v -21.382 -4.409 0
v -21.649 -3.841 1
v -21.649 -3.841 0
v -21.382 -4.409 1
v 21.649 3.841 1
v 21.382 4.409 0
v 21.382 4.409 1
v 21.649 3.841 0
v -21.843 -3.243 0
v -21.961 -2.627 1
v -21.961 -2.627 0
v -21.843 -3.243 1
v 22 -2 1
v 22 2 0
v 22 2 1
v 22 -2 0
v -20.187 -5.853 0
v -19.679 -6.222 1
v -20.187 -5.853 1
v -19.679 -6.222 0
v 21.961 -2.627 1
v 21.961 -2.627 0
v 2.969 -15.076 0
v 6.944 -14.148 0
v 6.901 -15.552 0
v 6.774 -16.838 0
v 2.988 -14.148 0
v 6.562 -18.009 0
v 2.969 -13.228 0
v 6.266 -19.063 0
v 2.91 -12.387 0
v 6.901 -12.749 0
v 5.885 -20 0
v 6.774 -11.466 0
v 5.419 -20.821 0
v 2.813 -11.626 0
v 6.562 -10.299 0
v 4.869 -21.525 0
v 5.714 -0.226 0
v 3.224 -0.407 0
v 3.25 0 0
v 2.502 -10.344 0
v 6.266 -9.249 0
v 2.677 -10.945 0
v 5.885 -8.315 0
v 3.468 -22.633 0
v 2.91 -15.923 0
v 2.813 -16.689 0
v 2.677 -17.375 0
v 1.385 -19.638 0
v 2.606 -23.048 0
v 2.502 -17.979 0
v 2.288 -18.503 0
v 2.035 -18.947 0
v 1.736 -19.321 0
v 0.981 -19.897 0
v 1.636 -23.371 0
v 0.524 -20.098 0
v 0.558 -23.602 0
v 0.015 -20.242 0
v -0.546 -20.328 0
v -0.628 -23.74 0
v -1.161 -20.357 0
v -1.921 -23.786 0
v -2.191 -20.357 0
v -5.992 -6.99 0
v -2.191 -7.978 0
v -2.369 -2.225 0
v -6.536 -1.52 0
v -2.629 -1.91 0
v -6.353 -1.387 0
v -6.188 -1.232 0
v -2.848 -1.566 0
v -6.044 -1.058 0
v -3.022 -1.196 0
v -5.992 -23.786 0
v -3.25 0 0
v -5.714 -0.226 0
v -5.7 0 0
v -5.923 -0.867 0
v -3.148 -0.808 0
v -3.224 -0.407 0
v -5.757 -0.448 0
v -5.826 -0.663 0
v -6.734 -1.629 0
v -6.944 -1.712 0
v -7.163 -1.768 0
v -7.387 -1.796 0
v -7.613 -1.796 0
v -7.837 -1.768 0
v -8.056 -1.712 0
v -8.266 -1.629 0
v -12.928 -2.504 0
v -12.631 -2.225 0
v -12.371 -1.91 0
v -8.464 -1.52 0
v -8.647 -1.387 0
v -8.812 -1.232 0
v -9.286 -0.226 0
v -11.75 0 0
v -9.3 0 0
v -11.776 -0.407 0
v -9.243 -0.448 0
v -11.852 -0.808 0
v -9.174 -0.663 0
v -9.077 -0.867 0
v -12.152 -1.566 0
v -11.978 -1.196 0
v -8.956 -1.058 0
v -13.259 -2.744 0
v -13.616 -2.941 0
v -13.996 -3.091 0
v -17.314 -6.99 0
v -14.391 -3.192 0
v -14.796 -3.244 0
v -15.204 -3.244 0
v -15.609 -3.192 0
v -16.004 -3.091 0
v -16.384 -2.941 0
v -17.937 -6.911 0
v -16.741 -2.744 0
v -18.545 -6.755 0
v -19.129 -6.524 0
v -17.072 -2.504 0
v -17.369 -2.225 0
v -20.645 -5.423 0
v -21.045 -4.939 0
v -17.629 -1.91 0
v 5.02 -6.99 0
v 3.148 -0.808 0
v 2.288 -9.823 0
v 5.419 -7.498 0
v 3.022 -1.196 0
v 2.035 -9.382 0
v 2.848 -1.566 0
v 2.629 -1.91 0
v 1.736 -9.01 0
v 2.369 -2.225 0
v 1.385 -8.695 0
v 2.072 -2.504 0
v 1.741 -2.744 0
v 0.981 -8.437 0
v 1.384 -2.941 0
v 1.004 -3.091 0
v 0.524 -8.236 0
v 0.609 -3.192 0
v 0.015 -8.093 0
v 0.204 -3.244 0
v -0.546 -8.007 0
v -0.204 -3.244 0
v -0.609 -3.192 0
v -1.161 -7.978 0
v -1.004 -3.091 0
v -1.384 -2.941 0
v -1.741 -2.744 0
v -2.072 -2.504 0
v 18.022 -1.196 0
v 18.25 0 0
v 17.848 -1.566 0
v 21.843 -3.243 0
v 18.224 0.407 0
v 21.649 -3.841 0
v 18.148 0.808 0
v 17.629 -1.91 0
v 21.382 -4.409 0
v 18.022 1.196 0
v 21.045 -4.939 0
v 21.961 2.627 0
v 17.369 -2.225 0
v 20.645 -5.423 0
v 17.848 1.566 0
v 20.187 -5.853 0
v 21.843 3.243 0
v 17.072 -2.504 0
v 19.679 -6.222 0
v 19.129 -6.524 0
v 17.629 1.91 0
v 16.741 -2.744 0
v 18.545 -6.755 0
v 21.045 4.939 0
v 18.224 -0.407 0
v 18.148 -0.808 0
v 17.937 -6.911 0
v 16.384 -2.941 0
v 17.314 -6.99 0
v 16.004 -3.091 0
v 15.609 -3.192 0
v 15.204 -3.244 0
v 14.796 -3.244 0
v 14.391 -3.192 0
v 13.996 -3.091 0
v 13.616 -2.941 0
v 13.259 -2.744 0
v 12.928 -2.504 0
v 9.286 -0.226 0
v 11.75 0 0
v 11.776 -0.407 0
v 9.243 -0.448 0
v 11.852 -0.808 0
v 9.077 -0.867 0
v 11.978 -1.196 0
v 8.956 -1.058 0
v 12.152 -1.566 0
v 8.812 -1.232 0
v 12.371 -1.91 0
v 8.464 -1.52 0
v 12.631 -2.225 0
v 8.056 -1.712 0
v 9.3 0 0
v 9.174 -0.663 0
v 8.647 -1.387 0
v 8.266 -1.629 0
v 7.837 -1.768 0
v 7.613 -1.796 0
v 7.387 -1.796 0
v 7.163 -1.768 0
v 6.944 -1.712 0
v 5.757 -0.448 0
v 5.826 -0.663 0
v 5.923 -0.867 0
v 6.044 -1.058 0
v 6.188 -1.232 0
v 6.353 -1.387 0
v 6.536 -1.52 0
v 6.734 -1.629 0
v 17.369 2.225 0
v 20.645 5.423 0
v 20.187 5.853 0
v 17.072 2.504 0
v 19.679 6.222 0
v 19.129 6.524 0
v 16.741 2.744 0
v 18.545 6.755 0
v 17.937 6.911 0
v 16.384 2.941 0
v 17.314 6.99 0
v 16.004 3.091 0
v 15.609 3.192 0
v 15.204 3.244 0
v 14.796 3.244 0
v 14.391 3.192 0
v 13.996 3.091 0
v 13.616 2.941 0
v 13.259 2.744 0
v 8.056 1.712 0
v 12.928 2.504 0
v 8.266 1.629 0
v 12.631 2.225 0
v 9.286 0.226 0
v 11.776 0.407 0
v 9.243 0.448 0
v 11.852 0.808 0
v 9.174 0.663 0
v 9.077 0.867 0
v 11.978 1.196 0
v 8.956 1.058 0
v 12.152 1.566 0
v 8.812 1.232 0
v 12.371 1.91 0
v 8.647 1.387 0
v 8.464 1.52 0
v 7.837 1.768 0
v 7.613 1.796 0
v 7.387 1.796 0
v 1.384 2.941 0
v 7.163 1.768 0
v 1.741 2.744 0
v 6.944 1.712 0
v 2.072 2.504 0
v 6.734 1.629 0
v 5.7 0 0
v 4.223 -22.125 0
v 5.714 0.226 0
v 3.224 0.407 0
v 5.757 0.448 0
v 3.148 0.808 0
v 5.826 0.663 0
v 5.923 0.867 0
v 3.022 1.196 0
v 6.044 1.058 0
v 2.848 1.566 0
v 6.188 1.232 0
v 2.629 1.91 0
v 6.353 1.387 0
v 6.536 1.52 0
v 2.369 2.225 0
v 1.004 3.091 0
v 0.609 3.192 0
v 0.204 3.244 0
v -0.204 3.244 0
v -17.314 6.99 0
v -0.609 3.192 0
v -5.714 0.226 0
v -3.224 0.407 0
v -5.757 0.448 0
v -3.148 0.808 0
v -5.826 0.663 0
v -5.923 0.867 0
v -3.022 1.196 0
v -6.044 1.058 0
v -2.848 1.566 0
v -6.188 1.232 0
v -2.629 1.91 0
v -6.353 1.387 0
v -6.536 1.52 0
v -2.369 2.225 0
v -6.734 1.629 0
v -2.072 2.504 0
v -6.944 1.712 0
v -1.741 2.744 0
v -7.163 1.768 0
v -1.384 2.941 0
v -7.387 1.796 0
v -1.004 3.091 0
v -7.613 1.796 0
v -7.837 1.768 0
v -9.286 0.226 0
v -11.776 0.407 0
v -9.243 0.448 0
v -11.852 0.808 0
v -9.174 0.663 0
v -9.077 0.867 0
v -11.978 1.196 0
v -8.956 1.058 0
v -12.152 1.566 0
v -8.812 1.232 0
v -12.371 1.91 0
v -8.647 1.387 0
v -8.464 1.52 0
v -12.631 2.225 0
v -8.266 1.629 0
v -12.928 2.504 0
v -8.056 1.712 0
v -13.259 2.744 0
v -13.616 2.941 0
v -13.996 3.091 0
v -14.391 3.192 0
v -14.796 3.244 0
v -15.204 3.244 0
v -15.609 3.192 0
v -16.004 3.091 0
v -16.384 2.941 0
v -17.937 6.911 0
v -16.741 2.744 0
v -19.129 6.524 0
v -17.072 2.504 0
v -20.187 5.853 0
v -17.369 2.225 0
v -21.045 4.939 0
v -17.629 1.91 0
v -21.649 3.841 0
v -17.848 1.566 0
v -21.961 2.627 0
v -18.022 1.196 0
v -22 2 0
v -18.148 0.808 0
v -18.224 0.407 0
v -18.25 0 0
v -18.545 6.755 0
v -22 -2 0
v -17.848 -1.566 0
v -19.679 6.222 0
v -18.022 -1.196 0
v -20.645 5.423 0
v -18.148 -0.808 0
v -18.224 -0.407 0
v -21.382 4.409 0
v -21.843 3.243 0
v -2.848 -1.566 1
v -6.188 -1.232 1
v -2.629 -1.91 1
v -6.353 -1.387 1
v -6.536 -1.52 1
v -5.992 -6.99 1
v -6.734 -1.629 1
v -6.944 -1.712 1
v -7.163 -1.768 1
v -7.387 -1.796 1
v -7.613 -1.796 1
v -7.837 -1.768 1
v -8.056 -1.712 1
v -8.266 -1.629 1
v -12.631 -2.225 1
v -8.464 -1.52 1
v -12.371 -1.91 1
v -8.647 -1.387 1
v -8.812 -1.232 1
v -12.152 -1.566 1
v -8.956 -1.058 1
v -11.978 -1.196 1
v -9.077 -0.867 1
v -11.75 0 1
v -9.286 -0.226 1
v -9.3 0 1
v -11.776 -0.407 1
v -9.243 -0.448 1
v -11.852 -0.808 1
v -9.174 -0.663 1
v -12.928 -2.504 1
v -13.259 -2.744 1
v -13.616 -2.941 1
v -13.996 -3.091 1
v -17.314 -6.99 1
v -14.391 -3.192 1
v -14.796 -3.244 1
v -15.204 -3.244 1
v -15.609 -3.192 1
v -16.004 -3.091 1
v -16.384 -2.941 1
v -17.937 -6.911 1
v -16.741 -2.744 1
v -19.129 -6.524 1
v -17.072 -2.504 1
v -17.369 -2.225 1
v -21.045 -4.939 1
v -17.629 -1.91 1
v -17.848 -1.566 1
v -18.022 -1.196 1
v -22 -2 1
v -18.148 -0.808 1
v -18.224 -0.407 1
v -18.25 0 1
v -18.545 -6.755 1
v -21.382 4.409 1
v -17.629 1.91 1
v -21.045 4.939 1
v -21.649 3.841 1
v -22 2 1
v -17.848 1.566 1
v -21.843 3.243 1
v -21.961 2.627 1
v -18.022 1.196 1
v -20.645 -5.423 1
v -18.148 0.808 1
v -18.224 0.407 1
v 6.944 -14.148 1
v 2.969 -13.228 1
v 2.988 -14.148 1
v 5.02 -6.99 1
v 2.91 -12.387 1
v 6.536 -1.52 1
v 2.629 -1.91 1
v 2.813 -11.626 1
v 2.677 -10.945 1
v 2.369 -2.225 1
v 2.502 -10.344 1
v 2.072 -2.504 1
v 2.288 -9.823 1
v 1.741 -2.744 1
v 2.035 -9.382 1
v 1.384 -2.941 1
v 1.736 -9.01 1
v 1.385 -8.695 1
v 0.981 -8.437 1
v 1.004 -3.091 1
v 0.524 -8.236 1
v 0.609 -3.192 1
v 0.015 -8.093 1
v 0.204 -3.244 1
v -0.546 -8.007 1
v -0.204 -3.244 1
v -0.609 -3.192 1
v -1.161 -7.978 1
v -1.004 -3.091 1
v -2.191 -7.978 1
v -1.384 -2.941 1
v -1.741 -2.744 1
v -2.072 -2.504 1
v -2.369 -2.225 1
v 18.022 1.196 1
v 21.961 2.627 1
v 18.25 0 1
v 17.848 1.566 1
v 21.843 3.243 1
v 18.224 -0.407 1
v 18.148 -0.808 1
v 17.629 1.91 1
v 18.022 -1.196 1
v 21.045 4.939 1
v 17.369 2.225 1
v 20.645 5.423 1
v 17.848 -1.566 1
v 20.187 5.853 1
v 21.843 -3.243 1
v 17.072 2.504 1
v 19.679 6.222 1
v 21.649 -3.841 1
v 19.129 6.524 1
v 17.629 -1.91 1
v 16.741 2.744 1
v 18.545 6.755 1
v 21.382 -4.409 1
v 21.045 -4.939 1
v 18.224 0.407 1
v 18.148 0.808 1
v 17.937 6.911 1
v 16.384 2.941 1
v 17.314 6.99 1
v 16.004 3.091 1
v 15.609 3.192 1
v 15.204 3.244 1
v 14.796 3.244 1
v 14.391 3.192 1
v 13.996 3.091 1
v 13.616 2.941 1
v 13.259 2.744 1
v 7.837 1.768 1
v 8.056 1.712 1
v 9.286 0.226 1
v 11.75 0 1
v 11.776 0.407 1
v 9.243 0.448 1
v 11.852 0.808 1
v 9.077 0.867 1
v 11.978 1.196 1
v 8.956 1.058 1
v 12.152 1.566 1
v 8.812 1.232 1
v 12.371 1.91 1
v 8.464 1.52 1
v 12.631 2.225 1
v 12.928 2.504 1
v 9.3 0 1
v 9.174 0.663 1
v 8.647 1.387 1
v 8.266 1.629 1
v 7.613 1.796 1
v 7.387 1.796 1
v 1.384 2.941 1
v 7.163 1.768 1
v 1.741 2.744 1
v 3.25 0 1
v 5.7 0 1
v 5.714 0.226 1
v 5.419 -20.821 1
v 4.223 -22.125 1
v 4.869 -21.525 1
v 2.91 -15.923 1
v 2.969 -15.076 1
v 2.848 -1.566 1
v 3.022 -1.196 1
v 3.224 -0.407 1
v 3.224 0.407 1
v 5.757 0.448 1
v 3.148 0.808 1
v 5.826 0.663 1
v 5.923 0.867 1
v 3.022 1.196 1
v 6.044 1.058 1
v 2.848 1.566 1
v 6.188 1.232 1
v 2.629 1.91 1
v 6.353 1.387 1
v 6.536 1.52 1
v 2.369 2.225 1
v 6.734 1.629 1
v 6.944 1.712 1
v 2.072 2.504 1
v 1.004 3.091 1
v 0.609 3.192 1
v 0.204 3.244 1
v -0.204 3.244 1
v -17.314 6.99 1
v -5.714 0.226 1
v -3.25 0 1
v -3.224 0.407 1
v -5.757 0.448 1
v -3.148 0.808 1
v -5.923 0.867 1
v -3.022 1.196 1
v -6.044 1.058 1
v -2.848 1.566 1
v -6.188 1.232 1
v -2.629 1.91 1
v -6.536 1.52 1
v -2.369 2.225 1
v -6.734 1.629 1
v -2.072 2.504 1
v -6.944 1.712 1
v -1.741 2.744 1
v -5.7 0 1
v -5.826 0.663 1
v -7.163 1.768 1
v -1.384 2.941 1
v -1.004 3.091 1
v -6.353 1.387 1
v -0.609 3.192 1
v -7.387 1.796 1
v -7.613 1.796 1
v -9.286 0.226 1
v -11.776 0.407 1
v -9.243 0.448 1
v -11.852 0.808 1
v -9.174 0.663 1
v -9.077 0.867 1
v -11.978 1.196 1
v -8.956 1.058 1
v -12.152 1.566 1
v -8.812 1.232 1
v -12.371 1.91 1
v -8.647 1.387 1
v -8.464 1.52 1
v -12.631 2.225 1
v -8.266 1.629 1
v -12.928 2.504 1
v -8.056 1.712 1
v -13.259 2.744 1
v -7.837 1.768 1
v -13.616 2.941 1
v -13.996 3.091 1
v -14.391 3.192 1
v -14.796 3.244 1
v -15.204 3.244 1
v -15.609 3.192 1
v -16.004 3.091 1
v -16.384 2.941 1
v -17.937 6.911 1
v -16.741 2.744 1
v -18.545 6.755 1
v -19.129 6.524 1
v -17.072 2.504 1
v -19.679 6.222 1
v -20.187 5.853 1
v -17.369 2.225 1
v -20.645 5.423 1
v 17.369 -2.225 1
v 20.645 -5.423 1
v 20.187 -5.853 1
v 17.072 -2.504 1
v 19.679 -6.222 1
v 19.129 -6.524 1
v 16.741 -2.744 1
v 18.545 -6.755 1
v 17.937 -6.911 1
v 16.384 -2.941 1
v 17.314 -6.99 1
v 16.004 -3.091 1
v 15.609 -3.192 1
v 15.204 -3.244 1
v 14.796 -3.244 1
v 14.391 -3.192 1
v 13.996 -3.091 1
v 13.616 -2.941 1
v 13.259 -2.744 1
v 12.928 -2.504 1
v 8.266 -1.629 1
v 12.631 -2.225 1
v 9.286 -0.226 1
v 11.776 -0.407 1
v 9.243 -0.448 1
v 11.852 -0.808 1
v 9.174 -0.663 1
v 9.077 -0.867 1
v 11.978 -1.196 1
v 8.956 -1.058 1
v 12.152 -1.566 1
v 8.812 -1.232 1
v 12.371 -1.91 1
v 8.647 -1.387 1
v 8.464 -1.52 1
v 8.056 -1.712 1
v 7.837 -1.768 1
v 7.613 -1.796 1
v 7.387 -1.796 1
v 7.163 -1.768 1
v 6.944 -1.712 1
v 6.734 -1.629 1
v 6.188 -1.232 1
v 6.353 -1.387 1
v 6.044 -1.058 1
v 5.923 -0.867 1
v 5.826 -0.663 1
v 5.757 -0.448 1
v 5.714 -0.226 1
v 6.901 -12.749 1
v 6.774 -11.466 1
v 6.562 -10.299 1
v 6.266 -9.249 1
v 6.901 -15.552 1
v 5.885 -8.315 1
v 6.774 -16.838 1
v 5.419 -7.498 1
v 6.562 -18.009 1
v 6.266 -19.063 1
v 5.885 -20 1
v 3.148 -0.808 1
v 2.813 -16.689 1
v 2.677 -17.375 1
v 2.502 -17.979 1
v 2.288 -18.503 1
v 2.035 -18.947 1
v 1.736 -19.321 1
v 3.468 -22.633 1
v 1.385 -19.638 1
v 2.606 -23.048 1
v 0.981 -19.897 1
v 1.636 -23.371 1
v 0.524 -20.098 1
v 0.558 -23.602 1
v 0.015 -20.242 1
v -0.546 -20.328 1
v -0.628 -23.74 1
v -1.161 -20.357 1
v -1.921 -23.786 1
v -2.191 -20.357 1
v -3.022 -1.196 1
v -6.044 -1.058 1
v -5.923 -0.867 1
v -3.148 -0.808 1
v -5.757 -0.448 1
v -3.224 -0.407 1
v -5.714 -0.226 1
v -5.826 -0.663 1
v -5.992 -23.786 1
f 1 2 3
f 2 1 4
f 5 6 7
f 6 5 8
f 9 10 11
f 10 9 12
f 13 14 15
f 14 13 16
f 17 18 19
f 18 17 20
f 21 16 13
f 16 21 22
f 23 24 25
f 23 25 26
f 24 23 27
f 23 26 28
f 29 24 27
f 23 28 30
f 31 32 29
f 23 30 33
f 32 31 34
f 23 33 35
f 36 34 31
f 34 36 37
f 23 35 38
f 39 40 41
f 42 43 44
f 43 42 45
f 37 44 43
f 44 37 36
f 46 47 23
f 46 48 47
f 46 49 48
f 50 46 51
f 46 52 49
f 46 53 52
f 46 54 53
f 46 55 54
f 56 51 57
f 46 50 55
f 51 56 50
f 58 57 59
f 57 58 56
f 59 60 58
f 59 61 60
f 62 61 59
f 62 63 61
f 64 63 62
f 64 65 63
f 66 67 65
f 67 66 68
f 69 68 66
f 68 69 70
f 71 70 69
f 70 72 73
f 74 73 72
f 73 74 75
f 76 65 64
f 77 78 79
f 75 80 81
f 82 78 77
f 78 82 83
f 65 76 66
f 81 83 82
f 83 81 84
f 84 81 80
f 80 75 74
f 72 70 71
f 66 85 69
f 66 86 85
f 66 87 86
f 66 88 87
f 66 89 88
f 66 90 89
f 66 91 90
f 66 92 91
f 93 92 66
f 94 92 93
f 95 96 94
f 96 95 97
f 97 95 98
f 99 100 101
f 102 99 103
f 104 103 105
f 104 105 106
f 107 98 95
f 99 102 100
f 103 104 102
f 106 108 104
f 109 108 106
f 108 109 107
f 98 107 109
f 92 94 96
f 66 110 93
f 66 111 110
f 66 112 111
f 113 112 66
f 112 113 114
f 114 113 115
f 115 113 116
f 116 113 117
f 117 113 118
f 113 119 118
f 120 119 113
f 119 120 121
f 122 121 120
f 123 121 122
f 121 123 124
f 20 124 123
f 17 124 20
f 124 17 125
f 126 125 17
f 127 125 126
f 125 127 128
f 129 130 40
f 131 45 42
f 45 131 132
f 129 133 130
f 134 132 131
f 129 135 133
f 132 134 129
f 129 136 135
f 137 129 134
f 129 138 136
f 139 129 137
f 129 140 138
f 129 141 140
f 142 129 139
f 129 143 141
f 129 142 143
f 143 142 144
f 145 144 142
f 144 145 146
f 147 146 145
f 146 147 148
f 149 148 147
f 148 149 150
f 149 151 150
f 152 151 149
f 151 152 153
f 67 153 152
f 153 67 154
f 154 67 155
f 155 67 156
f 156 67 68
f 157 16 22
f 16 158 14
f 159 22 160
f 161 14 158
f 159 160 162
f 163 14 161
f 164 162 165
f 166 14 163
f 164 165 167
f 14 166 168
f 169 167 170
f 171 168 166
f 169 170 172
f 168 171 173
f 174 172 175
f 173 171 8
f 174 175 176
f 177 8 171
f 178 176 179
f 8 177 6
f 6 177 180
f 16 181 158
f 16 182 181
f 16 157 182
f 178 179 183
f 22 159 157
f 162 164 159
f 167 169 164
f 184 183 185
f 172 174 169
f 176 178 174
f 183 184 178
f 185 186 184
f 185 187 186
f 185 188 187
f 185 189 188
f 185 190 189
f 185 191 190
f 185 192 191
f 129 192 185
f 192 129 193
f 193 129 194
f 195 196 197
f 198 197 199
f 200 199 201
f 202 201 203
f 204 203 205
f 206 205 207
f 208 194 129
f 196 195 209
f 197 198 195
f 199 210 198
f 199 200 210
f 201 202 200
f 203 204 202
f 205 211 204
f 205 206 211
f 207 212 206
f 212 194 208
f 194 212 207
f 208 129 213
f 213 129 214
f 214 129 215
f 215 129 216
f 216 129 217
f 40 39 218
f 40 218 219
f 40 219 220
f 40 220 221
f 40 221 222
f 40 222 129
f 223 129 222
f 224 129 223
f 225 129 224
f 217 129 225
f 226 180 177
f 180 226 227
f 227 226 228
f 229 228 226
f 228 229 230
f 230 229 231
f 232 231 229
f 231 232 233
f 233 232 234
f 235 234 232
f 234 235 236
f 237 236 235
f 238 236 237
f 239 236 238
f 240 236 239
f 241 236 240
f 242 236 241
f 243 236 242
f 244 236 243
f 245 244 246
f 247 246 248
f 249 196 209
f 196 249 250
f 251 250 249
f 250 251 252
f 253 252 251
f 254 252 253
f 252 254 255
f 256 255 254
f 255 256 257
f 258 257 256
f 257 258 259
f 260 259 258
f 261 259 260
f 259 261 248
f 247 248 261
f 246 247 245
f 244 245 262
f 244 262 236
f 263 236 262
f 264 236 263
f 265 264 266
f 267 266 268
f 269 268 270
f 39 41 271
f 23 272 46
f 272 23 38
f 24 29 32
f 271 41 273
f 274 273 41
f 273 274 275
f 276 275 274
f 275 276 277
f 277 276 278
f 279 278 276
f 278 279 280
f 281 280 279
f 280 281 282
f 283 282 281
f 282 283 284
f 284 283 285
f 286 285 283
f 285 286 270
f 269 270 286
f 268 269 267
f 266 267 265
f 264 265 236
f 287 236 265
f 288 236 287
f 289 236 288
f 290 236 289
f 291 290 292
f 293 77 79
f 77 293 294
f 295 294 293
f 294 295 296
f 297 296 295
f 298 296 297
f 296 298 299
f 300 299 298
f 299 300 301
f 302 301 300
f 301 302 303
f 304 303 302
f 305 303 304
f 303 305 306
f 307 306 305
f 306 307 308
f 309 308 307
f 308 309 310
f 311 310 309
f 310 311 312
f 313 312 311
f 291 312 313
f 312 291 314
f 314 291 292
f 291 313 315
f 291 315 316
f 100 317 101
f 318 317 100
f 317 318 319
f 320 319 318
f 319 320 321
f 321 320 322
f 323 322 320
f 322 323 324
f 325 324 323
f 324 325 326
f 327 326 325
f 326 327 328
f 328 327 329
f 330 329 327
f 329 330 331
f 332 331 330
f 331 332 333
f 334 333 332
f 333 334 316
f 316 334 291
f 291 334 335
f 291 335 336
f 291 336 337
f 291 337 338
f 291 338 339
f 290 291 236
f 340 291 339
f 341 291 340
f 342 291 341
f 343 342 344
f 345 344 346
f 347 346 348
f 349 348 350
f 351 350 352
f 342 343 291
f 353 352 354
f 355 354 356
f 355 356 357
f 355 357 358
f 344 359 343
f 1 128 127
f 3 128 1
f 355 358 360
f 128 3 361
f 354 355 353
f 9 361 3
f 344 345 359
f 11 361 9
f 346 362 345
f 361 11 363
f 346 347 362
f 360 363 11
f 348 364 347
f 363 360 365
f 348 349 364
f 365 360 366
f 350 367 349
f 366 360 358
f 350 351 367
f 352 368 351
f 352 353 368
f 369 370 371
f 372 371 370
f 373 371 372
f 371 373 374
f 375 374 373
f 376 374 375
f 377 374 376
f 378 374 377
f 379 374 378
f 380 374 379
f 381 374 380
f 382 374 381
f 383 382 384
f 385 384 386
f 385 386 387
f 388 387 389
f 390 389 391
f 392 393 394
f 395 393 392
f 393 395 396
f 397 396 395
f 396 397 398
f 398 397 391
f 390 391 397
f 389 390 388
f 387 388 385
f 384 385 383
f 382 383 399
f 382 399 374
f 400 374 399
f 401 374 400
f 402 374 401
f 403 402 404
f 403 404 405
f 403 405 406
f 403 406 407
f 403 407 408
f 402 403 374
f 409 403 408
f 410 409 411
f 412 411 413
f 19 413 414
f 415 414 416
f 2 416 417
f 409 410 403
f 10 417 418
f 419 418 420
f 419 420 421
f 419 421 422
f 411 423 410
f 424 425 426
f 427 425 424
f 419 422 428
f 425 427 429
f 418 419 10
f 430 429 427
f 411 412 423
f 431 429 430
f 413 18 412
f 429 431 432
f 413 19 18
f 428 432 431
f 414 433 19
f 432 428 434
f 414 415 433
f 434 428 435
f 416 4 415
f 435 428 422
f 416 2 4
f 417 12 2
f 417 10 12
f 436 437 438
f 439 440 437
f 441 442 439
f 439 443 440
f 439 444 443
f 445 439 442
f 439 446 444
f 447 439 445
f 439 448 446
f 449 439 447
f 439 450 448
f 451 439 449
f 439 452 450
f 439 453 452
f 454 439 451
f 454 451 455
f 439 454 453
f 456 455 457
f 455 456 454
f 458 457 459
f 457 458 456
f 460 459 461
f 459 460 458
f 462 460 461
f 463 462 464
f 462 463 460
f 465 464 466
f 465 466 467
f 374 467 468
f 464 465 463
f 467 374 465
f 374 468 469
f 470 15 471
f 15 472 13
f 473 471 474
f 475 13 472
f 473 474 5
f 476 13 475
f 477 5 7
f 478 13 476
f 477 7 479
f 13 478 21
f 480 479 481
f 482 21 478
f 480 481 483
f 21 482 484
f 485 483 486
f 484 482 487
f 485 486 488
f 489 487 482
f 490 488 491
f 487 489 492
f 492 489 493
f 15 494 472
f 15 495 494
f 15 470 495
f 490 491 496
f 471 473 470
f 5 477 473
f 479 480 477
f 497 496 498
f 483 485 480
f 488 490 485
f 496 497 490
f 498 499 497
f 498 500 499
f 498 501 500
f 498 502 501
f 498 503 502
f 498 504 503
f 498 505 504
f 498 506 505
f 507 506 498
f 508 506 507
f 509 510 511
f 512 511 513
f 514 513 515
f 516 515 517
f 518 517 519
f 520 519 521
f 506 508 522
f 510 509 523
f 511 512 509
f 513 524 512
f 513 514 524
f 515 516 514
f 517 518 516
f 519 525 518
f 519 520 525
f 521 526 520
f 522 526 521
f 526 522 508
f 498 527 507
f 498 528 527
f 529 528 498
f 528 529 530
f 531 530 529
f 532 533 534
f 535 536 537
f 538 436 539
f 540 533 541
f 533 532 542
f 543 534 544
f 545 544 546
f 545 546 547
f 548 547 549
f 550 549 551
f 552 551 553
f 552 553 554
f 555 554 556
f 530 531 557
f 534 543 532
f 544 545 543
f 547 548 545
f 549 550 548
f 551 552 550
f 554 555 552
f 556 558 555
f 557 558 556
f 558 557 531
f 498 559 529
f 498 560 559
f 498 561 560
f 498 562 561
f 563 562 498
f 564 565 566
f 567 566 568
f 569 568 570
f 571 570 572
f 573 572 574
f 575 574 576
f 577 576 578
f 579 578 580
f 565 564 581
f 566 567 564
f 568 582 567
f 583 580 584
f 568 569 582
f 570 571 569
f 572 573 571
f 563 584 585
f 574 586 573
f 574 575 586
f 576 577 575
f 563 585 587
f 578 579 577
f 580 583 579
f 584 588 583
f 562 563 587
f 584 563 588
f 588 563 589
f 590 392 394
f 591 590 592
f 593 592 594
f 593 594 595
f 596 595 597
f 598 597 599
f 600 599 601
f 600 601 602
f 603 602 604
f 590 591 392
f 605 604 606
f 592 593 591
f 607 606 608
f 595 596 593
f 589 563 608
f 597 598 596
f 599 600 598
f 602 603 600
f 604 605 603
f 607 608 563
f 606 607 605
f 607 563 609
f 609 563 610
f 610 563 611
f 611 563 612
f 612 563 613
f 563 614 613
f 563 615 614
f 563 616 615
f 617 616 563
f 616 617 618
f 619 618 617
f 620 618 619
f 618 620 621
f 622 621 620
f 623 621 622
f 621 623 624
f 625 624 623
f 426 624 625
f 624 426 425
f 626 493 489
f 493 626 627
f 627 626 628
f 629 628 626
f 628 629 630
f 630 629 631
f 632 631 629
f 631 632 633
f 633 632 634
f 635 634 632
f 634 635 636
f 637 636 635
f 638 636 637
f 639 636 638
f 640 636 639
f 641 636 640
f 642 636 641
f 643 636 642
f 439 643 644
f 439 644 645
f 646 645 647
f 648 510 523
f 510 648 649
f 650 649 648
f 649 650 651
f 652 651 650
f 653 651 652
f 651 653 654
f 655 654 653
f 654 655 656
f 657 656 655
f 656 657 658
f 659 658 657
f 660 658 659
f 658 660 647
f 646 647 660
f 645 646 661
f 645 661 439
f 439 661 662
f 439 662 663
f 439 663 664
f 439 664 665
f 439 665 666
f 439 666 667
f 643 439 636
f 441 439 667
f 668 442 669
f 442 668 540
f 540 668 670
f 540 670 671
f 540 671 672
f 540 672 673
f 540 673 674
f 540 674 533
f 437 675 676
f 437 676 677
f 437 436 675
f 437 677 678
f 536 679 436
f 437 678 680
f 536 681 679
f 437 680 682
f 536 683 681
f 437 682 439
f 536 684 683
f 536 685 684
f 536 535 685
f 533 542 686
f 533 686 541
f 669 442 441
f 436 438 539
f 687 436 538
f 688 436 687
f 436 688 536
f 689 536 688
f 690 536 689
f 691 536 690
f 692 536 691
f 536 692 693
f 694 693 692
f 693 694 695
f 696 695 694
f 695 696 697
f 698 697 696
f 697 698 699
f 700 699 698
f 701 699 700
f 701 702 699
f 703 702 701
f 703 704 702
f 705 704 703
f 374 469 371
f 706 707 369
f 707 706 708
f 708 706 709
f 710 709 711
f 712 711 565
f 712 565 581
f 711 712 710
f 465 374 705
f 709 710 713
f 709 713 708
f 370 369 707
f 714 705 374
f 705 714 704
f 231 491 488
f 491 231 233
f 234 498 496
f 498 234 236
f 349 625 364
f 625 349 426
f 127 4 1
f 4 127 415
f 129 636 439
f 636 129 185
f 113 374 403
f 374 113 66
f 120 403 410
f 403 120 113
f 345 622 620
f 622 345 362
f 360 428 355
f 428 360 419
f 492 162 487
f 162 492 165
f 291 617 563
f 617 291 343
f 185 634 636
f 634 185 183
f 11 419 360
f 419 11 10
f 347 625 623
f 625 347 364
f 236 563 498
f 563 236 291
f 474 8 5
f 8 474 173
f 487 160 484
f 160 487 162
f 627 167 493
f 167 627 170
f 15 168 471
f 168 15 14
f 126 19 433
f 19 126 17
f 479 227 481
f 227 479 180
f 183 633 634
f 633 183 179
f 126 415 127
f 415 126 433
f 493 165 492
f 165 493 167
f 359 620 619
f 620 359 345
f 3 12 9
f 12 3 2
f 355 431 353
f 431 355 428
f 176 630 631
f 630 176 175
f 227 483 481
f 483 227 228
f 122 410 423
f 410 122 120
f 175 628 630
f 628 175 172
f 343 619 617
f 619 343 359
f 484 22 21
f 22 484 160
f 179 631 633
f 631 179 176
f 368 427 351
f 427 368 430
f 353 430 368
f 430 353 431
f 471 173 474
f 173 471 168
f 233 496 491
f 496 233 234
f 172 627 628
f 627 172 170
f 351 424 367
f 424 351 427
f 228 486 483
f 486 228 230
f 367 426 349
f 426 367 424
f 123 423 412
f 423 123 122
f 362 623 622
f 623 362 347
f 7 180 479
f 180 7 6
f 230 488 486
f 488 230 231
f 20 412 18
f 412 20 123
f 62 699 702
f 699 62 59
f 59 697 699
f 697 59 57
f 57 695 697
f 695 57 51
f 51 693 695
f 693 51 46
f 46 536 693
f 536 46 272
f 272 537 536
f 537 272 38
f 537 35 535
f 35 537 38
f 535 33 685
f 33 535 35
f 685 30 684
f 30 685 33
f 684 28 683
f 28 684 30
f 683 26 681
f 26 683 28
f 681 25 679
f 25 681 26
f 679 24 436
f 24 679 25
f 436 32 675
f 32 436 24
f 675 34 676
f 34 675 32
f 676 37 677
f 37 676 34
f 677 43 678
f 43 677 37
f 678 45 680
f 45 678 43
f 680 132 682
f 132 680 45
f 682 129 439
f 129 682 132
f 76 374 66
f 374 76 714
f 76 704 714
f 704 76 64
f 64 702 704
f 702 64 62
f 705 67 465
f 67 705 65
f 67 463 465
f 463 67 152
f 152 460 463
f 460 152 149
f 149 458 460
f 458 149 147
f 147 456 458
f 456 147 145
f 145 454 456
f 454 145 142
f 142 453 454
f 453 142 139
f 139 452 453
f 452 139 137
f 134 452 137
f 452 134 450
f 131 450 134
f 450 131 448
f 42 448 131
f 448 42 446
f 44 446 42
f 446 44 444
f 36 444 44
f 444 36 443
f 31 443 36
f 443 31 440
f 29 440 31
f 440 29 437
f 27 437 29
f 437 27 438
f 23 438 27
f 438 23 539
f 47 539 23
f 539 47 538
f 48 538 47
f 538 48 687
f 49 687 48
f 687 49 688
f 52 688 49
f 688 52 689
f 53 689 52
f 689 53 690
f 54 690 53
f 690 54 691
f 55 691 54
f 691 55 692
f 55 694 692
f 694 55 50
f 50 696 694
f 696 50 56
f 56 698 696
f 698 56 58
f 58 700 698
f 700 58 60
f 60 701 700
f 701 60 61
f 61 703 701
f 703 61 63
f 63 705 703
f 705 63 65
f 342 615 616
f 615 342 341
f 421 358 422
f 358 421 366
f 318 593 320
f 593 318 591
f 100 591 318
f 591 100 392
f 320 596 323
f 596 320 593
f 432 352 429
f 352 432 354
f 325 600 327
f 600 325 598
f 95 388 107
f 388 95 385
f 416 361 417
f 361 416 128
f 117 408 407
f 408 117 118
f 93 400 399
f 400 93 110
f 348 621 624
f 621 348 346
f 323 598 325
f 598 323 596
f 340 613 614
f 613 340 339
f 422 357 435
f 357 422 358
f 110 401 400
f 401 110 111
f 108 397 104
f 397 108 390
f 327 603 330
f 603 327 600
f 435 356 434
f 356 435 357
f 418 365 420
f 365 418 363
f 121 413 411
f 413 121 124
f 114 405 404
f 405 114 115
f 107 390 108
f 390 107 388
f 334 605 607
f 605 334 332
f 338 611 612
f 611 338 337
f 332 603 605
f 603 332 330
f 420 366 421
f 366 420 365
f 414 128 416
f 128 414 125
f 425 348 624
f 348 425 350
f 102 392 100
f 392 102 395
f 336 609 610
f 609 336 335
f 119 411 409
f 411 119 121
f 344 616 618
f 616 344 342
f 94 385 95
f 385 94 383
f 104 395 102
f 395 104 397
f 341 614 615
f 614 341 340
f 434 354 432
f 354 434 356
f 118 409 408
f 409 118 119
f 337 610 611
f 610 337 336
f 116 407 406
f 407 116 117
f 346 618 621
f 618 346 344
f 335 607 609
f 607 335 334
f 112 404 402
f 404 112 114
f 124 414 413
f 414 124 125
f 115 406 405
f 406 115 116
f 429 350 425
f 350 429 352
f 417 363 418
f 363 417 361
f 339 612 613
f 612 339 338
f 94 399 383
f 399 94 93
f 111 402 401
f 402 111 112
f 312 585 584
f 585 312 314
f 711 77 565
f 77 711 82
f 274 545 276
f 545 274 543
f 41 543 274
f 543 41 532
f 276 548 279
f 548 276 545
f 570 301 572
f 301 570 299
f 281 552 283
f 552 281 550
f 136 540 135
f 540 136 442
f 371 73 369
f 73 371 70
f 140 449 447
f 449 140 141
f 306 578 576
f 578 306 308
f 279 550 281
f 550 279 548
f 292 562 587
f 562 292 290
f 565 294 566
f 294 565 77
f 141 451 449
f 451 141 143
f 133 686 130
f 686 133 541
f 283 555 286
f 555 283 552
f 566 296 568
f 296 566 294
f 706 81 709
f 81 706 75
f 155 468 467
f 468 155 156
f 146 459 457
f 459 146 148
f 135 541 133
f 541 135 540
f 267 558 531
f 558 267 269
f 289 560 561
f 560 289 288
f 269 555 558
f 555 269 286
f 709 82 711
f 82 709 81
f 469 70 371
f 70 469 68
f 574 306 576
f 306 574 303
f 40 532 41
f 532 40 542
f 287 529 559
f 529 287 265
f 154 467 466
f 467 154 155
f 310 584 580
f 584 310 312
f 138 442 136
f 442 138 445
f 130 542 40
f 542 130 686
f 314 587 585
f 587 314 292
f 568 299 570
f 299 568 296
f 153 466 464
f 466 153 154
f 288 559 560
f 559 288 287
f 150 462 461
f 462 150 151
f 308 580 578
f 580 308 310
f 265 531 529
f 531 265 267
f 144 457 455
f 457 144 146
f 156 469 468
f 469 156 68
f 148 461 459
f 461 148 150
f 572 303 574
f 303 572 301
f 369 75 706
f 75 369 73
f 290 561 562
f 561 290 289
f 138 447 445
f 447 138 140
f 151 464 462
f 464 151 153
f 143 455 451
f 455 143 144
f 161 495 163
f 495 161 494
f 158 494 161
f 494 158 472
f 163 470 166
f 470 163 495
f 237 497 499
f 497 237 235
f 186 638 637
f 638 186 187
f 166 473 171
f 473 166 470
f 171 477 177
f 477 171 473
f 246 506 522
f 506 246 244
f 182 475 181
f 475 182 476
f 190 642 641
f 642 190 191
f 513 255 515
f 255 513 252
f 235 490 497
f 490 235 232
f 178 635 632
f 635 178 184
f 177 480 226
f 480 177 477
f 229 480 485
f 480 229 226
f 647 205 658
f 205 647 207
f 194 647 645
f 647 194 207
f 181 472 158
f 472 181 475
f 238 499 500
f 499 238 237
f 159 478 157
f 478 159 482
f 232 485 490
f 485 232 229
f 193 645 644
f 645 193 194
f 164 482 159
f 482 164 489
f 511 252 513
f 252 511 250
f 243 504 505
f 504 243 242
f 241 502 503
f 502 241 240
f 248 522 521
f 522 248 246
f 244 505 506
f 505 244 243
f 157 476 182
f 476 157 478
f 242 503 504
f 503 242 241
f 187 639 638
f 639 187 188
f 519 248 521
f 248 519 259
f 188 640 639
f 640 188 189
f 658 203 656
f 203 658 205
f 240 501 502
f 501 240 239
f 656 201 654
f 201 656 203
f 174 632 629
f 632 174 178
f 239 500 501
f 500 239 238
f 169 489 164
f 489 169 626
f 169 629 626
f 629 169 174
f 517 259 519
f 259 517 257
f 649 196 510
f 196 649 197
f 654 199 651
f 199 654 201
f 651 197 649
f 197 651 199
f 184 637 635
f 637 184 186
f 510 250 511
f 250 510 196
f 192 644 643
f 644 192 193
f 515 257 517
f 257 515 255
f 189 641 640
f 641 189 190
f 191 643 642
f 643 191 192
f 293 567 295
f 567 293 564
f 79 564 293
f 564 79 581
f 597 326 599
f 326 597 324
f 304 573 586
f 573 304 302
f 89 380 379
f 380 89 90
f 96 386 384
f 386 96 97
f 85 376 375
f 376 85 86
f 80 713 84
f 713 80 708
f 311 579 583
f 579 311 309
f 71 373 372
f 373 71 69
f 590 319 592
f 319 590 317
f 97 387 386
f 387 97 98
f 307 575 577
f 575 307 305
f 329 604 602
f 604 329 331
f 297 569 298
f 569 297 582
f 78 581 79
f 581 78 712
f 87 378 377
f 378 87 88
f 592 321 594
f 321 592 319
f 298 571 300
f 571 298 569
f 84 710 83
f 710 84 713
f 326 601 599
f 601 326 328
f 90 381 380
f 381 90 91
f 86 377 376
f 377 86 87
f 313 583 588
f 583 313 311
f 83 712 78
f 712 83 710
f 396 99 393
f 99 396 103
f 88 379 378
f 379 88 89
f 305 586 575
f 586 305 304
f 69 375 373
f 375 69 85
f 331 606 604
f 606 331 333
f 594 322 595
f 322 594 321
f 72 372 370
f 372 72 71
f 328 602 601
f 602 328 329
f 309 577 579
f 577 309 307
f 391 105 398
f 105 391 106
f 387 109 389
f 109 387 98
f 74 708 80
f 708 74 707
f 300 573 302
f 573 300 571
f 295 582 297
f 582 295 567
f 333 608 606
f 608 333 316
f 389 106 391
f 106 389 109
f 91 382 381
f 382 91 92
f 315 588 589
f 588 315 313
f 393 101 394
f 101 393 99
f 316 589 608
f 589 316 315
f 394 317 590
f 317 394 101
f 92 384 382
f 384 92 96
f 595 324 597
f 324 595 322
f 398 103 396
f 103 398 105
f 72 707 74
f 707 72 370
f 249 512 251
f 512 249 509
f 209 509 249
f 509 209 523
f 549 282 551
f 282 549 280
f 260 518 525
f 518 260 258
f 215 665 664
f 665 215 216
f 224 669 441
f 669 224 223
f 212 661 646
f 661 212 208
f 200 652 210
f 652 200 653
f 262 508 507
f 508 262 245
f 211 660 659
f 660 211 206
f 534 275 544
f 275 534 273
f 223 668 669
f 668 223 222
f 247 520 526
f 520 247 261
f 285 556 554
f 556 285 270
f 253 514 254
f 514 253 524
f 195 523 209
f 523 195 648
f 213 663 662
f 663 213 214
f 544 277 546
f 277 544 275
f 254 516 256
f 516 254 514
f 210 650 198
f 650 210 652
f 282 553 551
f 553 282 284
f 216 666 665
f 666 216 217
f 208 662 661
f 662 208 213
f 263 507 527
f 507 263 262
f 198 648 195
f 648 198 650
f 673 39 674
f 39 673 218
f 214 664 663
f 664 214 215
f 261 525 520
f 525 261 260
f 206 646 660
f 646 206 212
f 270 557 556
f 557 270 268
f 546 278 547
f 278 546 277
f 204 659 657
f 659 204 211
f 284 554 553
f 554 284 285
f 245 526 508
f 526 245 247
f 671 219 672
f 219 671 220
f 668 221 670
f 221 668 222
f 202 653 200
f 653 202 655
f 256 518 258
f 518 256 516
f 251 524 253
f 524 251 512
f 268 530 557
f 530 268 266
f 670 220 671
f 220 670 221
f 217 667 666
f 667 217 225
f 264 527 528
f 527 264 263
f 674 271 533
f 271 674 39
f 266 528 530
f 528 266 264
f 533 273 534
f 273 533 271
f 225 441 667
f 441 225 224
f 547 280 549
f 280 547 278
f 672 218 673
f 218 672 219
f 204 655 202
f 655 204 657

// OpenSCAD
$fn = 50;


difference() {
	union() {
		*color(alpha = 1.0000000000, c = "gray") {
			translate(v = [0, 14, 0]) {
				linear_extrude(height = 1) {
					text(font = "Arial:style=Bold", halign = "center", size = 4.5000000000, text = "COMMENT description oobb_plate_shape_p_type_1_depth_3_width_1_thickness_d_extra_oobb_size", valign = "center");
				}
			}
		}
		hull() {
			translate(v = [-17.0000000000, 2.0000000000, 0]) {
				cylinder(h = 1, r = 5);
			}
			translate(v = [17.0000000000, 2.0000000000, 0]) {
				cylinder(h = 1, r = 5);
			}
			translate(v = [-17.0000000000, -2.0000000000, 0]) {
				cylinder(h = 1, r = 5);
			}
			translate(v = [17.0000000000, -2.0000000000, 0]) {
				cylinder(h = 1, r = 5);
			}
		}
		translate(v = [0, -5, 0]) {
			linear_extrude(height = 1) {
				text(font = "DejaVu Sans Mono:style=Bold", halign = "center", size = 19.0000000000, text = "D", valign = "top");
			}
		}
	}
	union() {
		*color(alpha = 1.0000000000, c = "gray") {
			translate(v = [0, 14, 0]) {
				linear_extrude(height = 1) {
					text(font = "Arial:style=Bold", halign = "center", size = 4.5000000000, text = "COMMENT description oobb_holes_shape_n_type_3_width_1_thickness_d_extra_oobb_size_1_height_'all'_holes_true_both_holes", valign = "center");
				}
			}
		}
		translate(v = [-15.0000000000, 0.0000000000, 0]) {
			translate(v = [0, 0, -50]) {
				cylinder(h = 100, r = 3.2500000000);
			}
		}
		translate(v = [0, 0, -50]) {
			cylinder(h = 100, r = 3.2500000000);
		}
		translate(v = [15.0000000000, 0.0000000000, 0]) {
			translate(v = [0, 0, -50]) {
				cylinder(h = 100, r = 3.2500000000);
			}
		}
		translate(v = [-15.0000000000, 0.0000000000, 0]) {
			translate(v = [0, 0, -50]) {
				cylinder(h = 100, r = 1.8000000000);
			}
		}
		translate(v = [-7.5000000000, 0.0000000000, 0]) {
			translate(v = [0, 0, -50]) {
				cylinder(h = 100, r = 1.8000000000);
			}
		}
		translate(v = [0, 0, -50]) {
			cylinder(h = 100, r = 1.8000000000);
		}
		translate(v = [7.5000000000, 0.0000000000, 0]) {
			translate(v = [0, 0, -50]) {
				cylinder(h = 100, r = 1.8000000000);
			}
		}
		translate(v = [15.0000000000, 0.0000000000, 0]) {
			translate(v = [0, 0, -50]) {
				cylinder(h = 100, r = 1.8000000000);
			}
		}
	}
}
